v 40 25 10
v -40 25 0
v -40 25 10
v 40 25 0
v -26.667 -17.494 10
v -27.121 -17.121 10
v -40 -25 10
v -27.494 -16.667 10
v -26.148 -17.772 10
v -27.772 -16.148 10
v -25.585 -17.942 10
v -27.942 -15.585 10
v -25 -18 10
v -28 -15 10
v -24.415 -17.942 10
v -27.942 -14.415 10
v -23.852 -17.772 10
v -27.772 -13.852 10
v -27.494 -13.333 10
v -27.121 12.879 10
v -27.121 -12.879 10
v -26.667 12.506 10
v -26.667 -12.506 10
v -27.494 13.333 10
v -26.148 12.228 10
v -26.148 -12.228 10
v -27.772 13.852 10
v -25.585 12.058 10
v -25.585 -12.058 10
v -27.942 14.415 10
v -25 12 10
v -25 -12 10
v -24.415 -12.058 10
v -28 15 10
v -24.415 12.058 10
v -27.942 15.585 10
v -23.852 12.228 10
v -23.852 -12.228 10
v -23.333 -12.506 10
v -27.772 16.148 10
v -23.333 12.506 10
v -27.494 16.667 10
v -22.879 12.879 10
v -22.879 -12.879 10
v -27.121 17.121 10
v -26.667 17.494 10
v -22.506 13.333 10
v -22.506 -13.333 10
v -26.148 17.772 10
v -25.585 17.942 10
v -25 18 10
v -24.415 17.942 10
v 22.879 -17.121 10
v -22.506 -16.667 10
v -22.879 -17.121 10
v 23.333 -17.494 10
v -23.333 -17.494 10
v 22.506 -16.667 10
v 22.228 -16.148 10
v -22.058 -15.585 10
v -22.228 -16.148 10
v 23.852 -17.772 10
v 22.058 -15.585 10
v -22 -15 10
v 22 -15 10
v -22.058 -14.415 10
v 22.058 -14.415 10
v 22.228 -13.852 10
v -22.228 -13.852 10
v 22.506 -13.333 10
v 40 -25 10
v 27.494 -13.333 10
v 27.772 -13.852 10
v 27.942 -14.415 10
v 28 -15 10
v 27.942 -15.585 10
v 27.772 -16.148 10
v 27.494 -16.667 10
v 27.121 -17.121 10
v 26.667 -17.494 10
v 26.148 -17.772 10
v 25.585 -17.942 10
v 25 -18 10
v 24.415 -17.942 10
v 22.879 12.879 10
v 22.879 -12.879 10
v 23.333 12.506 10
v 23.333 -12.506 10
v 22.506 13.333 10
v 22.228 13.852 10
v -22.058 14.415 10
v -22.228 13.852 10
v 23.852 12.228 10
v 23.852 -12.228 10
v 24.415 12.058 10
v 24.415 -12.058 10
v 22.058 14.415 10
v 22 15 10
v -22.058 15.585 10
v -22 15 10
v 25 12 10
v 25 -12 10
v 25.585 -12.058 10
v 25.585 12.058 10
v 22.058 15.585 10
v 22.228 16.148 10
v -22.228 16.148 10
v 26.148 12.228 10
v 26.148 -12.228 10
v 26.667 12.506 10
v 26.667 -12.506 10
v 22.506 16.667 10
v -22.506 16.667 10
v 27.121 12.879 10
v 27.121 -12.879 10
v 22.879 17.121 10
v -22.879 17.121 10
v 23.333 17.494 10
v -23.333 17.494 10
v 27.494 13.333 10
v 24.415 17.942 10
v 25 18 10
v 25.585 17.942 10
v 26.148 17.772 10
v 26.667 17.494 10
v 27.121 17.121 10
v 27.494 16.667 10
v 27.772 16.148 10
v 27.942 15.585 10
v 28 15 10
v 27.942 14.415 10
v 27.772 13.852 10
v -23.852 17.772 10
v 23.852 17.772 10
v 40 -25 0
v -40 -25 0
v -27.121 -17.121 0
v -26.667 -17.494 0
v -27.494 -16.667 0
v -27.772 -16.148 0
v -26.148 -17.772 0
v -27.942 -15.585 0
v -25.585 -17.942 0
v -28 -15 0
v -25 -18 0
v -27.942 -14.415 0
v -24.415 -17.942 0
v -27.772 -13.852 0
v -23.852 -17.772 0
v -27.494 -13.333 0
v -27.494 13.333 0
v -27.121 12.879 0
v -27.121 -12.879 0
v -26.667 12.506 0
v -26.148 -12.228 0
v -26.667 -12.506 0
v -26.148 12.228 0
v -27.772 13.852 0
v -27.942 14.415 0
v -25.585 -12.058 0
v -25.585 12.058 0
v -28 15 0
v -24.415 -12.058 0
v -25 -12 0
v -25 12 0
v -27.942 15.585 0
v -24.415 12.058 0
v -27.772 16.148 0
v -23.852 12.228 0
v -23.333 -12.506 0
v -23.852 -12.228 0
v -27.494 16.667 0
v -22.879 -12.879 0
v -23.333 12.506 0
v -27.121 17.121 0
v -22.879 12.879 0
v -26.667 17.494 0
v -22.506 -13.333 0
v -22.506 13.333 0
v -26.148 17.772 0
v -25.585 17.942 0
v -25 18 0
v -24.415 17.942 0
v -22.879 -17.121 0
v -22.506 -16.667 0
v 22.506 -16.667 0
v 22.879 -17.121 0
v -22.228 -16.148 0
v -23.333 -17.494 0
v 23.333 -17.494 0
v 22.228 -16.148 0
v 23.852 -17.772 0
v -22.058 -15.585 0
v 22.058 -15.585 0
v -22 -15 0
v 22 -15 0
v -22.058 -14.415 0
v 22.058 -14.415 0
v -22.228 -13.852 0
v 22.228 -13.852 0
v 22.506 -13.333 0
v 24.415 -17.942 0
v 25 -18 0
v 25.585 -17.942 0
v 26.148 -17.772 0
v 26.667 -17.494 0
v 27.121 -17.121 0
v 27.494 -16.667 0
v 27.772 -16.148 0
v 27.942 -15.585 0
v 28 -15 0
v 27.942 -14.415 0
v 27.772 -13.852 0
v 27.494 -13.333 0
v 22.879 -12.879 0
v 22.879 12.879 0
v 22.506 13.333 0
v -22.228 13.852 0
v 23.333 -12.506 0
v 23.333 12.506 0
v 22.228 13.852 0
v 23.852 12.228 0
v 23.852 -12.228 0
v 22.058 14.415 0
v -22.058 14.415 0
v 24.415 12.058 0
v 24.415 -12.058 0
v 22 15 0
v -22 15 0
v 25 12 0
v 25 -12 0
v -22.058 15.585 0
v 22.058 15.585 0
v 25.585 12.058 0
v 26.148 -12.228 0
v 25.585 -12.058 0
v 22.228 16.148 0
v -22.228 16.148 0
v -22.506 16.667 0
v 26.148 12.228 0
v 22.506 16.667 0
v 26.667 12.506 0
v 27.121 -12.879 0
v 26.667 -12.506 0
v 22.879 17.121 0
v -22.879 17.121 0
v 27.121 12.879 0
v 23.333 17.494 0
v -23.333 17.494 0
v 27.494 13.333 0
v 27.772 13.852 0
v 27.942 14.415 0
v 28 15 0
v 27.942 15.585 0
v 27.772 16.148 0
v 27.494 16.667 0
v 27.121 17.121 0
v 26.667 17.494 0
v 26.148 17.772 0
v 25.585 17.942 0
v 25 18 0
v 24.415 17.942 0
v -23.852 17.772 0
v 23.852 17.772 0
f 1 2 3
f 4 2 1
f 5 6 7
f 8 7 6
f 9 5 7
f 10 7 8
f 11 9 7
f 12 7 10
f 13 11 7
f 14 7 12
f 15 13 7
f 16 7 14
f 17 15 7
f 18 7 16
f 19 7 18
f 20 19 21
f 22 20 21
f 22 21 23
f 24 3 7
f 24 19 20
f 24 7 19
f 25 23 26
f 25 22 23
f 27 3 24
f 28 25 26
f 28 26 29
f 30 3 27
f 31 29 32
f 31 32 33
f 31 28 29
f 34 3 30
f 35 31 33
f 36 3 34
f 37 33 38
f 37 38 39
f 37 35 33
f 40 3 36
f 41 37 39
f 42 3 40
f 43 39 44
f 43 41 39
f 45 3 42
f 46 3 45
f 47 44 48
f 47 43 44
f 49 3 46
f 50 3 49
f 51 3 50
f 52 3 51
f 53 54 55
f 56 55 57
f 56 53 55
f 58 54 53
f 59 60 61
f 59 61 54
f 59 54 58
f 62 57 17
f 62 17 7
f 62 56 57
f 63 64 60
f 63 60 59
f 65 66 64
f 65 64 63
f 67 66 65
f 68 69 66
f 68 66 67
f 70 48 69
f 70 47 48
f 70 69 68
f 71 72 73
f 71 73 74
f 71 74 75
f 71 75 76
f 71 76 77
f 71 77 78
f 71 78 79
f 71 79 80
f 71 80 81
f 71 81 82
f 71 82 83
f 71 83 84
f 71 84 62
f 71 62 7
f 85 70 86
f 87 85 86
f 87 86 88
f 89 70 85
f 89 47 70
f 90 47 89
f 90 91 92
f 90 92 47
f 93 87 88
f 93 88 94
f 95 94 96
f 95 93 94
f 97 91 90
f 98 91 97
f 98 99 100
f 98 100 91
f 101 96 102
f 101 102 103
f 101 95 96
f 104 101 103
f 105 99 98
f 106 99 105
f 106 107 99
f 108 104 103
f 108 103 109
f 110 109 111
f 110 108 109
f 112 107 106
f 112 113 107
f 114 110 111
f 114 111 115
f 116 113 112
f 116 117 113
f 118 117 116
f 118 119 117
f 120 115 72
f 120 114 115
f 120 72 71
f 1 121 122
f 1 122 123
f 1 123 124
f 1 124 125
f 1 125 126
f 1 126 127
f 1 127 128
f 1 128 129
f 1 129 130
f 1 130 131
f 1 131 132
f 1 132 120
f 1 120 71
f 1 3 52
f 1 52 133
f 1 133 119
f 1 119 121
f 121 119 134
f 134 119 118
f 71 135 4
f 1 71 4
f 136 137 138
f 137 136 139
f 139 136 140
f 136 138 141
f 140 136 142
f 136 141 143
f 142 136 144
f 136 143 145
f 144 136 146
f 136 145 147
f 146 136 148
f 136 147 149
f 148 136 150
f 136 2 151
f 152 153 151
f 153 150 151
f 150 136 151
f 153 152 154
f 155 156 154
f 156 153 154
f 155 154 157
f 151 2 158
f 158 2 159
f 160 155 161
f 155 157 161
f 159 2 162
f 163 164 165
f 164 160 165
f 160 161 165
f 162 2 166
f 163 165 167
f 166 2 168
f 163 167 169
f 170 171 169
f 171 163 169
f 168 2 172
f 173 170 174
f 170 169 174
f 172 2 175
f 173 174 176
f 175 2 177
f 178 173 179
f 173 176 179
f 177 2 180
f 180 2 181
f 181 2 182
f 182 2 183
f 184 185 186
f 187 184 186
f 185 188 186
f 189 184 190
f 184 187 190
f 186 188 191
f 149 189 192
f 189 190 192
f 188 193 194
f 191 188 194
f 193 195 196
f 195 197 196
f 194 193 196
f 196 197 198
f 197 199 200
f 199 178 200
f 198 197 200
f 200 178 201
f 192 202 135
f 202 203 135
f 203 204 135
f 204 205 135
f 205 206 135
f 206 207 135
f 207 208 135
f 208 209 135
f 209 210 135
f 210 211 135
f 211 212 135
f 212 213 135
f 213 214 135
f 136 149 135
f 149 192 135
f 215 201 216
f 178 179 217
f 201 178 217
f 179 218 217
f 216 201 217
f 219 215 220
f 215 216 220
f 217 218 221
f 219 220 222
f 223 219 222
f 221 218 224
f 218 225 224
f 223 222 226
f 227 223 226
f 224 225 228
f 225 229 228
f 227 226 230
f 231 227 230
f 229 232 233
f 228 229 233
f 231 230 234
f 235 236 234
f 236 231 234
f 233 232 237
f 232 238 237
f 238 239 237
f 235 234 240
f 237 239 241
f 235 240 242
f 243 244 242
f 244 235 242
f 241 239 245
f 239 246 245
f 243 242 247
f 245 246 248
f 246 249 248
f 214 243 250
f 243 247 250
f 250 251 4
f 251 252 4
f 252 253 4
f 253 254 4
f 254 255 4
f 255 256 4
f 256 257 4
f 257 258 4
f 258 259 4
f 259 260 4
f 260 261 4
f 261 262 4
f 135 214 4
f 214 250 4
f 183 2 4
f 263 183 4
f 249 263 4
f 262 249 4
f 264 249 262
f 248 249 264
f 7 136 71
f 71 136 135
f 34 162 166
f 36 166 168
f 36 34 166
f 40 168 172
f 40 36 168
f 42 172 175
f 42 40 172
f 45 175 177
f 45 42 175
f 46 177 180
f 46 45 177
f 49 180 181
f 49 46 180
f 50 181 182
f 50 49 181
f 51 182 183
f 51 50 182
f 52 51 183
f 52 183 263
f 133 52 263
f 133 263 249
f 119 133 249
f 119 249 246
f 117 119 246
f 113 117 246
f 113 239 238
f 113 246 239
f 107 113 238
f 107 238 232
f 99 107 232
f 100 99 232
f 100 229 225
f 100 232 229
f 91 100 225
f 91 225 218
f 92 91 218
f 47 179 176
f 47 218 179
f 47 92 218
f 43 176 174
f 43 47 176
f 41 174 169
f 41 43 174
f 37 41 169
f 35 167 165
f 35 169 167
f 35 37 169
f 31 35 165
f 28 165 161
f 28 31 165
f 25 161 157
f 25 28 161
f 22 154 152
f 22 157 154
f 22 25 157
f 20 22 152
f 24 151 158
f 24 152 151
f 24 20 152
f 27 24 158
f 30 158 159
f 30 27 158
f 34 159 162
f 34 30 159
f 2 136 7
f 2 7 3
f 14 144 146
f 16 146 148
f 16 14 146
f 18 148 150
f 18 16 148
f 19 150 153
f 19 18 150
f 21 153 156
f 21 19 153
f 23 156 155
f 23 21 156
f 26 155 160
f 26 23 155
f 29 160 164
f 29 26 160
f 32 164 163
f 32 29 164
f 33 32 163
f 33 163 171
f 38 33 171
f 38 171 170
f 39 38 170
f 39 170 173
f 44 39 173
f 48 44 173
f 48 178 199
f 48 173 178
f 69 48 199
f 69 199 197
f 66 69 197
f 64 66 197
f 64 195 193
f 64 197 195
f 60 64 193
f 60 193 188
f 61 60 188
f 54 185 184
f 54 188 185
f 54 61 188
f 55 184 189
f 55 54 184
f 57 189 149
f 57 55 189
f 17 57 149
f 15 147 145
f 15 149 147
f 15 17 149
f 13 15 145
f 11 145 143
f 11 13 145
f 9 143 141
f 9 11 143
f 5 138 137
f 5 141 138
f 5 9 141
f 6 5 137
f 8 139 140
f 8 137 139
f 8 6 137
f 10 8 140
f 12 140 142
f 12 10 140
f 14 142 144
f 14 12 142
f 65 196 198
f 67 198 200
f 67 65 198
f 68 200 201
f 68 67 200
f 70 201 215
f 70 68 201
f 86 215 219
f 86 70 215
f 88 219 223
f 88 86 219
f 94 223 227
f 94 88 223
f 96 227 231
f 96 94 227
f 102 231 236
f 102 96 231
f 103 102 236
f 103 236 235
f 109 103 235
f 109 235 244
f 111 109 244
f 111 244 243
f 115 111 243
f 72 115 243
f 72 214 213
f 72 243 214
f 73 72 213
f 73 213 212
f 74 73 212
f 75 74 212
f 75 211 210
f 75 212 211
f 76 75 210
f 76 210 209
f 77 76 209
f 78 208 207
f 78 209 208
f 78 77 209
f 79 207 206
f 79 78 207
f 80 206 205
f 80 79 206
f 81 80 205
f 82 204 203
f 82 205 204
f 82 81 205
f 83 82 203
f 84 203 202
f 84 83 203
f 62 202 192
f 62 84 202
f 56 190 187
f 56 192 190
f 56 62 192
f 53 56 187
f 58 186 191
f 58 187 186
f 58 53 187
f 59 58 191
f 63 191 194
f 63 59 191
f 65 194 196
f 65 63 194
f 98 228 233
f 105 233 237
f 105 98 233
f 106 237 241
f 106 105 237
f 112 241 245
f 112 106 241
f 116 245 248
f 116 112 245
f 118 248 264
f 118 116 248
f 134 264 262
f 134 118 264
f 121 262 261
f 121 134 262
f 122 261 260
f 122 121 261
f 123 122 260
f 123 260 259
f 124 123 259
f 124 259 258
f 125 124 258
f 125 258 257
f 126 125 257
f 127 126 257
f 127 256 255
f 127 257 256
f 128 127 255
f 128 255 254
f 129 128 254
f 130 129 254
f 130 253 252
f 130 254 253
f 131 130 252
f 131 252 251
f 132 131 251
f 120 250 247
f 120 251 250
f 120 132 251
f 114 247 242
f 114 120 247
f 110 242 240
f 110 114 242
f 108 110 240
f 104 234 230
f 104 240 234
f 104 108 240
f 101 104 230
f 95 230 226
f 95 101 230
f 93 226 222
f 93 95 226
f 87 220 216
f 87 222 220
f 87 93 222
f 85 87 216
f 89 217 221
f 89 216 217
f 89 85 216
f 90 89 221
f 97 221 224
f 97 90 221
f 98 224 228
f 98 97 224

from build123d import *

# Parameters (mm, degrees)
BASE_W      = 80
BASE_H      = 50
BLOCK_DEPTH = 10
HOLES_2_R   = 3
HOLES_DEPTH = 49.218253805


with BuildPart() as part:
    # base → block (new body)
    with BuildSketch(Plane.XY):
        Rectangle(BASE_W, BASE_H)
    extrude(amount=BLOCK_DEPTH)

    # holes 2 → holes (cut, through all)
    with BuildSketch(Plane(origin=(0, 0, 10), x_dir=(-1, 0, 0), z_dir=(0, 0, -1))):
        with Locations((25, 15)):
            Circle(HOLES_2_R)
        with Locations((25, -15)):
            Circle(HOLES_2_R)
        with Locations((-25, 15)):
            Circle(HOLES_2_R)
        with Locations((-25, -15)):
            Circle(HOLES_2_R)
    extrude(amount=HOLES_DEPTH, mode=Mode.SUBTRACT)


solid = part.part
